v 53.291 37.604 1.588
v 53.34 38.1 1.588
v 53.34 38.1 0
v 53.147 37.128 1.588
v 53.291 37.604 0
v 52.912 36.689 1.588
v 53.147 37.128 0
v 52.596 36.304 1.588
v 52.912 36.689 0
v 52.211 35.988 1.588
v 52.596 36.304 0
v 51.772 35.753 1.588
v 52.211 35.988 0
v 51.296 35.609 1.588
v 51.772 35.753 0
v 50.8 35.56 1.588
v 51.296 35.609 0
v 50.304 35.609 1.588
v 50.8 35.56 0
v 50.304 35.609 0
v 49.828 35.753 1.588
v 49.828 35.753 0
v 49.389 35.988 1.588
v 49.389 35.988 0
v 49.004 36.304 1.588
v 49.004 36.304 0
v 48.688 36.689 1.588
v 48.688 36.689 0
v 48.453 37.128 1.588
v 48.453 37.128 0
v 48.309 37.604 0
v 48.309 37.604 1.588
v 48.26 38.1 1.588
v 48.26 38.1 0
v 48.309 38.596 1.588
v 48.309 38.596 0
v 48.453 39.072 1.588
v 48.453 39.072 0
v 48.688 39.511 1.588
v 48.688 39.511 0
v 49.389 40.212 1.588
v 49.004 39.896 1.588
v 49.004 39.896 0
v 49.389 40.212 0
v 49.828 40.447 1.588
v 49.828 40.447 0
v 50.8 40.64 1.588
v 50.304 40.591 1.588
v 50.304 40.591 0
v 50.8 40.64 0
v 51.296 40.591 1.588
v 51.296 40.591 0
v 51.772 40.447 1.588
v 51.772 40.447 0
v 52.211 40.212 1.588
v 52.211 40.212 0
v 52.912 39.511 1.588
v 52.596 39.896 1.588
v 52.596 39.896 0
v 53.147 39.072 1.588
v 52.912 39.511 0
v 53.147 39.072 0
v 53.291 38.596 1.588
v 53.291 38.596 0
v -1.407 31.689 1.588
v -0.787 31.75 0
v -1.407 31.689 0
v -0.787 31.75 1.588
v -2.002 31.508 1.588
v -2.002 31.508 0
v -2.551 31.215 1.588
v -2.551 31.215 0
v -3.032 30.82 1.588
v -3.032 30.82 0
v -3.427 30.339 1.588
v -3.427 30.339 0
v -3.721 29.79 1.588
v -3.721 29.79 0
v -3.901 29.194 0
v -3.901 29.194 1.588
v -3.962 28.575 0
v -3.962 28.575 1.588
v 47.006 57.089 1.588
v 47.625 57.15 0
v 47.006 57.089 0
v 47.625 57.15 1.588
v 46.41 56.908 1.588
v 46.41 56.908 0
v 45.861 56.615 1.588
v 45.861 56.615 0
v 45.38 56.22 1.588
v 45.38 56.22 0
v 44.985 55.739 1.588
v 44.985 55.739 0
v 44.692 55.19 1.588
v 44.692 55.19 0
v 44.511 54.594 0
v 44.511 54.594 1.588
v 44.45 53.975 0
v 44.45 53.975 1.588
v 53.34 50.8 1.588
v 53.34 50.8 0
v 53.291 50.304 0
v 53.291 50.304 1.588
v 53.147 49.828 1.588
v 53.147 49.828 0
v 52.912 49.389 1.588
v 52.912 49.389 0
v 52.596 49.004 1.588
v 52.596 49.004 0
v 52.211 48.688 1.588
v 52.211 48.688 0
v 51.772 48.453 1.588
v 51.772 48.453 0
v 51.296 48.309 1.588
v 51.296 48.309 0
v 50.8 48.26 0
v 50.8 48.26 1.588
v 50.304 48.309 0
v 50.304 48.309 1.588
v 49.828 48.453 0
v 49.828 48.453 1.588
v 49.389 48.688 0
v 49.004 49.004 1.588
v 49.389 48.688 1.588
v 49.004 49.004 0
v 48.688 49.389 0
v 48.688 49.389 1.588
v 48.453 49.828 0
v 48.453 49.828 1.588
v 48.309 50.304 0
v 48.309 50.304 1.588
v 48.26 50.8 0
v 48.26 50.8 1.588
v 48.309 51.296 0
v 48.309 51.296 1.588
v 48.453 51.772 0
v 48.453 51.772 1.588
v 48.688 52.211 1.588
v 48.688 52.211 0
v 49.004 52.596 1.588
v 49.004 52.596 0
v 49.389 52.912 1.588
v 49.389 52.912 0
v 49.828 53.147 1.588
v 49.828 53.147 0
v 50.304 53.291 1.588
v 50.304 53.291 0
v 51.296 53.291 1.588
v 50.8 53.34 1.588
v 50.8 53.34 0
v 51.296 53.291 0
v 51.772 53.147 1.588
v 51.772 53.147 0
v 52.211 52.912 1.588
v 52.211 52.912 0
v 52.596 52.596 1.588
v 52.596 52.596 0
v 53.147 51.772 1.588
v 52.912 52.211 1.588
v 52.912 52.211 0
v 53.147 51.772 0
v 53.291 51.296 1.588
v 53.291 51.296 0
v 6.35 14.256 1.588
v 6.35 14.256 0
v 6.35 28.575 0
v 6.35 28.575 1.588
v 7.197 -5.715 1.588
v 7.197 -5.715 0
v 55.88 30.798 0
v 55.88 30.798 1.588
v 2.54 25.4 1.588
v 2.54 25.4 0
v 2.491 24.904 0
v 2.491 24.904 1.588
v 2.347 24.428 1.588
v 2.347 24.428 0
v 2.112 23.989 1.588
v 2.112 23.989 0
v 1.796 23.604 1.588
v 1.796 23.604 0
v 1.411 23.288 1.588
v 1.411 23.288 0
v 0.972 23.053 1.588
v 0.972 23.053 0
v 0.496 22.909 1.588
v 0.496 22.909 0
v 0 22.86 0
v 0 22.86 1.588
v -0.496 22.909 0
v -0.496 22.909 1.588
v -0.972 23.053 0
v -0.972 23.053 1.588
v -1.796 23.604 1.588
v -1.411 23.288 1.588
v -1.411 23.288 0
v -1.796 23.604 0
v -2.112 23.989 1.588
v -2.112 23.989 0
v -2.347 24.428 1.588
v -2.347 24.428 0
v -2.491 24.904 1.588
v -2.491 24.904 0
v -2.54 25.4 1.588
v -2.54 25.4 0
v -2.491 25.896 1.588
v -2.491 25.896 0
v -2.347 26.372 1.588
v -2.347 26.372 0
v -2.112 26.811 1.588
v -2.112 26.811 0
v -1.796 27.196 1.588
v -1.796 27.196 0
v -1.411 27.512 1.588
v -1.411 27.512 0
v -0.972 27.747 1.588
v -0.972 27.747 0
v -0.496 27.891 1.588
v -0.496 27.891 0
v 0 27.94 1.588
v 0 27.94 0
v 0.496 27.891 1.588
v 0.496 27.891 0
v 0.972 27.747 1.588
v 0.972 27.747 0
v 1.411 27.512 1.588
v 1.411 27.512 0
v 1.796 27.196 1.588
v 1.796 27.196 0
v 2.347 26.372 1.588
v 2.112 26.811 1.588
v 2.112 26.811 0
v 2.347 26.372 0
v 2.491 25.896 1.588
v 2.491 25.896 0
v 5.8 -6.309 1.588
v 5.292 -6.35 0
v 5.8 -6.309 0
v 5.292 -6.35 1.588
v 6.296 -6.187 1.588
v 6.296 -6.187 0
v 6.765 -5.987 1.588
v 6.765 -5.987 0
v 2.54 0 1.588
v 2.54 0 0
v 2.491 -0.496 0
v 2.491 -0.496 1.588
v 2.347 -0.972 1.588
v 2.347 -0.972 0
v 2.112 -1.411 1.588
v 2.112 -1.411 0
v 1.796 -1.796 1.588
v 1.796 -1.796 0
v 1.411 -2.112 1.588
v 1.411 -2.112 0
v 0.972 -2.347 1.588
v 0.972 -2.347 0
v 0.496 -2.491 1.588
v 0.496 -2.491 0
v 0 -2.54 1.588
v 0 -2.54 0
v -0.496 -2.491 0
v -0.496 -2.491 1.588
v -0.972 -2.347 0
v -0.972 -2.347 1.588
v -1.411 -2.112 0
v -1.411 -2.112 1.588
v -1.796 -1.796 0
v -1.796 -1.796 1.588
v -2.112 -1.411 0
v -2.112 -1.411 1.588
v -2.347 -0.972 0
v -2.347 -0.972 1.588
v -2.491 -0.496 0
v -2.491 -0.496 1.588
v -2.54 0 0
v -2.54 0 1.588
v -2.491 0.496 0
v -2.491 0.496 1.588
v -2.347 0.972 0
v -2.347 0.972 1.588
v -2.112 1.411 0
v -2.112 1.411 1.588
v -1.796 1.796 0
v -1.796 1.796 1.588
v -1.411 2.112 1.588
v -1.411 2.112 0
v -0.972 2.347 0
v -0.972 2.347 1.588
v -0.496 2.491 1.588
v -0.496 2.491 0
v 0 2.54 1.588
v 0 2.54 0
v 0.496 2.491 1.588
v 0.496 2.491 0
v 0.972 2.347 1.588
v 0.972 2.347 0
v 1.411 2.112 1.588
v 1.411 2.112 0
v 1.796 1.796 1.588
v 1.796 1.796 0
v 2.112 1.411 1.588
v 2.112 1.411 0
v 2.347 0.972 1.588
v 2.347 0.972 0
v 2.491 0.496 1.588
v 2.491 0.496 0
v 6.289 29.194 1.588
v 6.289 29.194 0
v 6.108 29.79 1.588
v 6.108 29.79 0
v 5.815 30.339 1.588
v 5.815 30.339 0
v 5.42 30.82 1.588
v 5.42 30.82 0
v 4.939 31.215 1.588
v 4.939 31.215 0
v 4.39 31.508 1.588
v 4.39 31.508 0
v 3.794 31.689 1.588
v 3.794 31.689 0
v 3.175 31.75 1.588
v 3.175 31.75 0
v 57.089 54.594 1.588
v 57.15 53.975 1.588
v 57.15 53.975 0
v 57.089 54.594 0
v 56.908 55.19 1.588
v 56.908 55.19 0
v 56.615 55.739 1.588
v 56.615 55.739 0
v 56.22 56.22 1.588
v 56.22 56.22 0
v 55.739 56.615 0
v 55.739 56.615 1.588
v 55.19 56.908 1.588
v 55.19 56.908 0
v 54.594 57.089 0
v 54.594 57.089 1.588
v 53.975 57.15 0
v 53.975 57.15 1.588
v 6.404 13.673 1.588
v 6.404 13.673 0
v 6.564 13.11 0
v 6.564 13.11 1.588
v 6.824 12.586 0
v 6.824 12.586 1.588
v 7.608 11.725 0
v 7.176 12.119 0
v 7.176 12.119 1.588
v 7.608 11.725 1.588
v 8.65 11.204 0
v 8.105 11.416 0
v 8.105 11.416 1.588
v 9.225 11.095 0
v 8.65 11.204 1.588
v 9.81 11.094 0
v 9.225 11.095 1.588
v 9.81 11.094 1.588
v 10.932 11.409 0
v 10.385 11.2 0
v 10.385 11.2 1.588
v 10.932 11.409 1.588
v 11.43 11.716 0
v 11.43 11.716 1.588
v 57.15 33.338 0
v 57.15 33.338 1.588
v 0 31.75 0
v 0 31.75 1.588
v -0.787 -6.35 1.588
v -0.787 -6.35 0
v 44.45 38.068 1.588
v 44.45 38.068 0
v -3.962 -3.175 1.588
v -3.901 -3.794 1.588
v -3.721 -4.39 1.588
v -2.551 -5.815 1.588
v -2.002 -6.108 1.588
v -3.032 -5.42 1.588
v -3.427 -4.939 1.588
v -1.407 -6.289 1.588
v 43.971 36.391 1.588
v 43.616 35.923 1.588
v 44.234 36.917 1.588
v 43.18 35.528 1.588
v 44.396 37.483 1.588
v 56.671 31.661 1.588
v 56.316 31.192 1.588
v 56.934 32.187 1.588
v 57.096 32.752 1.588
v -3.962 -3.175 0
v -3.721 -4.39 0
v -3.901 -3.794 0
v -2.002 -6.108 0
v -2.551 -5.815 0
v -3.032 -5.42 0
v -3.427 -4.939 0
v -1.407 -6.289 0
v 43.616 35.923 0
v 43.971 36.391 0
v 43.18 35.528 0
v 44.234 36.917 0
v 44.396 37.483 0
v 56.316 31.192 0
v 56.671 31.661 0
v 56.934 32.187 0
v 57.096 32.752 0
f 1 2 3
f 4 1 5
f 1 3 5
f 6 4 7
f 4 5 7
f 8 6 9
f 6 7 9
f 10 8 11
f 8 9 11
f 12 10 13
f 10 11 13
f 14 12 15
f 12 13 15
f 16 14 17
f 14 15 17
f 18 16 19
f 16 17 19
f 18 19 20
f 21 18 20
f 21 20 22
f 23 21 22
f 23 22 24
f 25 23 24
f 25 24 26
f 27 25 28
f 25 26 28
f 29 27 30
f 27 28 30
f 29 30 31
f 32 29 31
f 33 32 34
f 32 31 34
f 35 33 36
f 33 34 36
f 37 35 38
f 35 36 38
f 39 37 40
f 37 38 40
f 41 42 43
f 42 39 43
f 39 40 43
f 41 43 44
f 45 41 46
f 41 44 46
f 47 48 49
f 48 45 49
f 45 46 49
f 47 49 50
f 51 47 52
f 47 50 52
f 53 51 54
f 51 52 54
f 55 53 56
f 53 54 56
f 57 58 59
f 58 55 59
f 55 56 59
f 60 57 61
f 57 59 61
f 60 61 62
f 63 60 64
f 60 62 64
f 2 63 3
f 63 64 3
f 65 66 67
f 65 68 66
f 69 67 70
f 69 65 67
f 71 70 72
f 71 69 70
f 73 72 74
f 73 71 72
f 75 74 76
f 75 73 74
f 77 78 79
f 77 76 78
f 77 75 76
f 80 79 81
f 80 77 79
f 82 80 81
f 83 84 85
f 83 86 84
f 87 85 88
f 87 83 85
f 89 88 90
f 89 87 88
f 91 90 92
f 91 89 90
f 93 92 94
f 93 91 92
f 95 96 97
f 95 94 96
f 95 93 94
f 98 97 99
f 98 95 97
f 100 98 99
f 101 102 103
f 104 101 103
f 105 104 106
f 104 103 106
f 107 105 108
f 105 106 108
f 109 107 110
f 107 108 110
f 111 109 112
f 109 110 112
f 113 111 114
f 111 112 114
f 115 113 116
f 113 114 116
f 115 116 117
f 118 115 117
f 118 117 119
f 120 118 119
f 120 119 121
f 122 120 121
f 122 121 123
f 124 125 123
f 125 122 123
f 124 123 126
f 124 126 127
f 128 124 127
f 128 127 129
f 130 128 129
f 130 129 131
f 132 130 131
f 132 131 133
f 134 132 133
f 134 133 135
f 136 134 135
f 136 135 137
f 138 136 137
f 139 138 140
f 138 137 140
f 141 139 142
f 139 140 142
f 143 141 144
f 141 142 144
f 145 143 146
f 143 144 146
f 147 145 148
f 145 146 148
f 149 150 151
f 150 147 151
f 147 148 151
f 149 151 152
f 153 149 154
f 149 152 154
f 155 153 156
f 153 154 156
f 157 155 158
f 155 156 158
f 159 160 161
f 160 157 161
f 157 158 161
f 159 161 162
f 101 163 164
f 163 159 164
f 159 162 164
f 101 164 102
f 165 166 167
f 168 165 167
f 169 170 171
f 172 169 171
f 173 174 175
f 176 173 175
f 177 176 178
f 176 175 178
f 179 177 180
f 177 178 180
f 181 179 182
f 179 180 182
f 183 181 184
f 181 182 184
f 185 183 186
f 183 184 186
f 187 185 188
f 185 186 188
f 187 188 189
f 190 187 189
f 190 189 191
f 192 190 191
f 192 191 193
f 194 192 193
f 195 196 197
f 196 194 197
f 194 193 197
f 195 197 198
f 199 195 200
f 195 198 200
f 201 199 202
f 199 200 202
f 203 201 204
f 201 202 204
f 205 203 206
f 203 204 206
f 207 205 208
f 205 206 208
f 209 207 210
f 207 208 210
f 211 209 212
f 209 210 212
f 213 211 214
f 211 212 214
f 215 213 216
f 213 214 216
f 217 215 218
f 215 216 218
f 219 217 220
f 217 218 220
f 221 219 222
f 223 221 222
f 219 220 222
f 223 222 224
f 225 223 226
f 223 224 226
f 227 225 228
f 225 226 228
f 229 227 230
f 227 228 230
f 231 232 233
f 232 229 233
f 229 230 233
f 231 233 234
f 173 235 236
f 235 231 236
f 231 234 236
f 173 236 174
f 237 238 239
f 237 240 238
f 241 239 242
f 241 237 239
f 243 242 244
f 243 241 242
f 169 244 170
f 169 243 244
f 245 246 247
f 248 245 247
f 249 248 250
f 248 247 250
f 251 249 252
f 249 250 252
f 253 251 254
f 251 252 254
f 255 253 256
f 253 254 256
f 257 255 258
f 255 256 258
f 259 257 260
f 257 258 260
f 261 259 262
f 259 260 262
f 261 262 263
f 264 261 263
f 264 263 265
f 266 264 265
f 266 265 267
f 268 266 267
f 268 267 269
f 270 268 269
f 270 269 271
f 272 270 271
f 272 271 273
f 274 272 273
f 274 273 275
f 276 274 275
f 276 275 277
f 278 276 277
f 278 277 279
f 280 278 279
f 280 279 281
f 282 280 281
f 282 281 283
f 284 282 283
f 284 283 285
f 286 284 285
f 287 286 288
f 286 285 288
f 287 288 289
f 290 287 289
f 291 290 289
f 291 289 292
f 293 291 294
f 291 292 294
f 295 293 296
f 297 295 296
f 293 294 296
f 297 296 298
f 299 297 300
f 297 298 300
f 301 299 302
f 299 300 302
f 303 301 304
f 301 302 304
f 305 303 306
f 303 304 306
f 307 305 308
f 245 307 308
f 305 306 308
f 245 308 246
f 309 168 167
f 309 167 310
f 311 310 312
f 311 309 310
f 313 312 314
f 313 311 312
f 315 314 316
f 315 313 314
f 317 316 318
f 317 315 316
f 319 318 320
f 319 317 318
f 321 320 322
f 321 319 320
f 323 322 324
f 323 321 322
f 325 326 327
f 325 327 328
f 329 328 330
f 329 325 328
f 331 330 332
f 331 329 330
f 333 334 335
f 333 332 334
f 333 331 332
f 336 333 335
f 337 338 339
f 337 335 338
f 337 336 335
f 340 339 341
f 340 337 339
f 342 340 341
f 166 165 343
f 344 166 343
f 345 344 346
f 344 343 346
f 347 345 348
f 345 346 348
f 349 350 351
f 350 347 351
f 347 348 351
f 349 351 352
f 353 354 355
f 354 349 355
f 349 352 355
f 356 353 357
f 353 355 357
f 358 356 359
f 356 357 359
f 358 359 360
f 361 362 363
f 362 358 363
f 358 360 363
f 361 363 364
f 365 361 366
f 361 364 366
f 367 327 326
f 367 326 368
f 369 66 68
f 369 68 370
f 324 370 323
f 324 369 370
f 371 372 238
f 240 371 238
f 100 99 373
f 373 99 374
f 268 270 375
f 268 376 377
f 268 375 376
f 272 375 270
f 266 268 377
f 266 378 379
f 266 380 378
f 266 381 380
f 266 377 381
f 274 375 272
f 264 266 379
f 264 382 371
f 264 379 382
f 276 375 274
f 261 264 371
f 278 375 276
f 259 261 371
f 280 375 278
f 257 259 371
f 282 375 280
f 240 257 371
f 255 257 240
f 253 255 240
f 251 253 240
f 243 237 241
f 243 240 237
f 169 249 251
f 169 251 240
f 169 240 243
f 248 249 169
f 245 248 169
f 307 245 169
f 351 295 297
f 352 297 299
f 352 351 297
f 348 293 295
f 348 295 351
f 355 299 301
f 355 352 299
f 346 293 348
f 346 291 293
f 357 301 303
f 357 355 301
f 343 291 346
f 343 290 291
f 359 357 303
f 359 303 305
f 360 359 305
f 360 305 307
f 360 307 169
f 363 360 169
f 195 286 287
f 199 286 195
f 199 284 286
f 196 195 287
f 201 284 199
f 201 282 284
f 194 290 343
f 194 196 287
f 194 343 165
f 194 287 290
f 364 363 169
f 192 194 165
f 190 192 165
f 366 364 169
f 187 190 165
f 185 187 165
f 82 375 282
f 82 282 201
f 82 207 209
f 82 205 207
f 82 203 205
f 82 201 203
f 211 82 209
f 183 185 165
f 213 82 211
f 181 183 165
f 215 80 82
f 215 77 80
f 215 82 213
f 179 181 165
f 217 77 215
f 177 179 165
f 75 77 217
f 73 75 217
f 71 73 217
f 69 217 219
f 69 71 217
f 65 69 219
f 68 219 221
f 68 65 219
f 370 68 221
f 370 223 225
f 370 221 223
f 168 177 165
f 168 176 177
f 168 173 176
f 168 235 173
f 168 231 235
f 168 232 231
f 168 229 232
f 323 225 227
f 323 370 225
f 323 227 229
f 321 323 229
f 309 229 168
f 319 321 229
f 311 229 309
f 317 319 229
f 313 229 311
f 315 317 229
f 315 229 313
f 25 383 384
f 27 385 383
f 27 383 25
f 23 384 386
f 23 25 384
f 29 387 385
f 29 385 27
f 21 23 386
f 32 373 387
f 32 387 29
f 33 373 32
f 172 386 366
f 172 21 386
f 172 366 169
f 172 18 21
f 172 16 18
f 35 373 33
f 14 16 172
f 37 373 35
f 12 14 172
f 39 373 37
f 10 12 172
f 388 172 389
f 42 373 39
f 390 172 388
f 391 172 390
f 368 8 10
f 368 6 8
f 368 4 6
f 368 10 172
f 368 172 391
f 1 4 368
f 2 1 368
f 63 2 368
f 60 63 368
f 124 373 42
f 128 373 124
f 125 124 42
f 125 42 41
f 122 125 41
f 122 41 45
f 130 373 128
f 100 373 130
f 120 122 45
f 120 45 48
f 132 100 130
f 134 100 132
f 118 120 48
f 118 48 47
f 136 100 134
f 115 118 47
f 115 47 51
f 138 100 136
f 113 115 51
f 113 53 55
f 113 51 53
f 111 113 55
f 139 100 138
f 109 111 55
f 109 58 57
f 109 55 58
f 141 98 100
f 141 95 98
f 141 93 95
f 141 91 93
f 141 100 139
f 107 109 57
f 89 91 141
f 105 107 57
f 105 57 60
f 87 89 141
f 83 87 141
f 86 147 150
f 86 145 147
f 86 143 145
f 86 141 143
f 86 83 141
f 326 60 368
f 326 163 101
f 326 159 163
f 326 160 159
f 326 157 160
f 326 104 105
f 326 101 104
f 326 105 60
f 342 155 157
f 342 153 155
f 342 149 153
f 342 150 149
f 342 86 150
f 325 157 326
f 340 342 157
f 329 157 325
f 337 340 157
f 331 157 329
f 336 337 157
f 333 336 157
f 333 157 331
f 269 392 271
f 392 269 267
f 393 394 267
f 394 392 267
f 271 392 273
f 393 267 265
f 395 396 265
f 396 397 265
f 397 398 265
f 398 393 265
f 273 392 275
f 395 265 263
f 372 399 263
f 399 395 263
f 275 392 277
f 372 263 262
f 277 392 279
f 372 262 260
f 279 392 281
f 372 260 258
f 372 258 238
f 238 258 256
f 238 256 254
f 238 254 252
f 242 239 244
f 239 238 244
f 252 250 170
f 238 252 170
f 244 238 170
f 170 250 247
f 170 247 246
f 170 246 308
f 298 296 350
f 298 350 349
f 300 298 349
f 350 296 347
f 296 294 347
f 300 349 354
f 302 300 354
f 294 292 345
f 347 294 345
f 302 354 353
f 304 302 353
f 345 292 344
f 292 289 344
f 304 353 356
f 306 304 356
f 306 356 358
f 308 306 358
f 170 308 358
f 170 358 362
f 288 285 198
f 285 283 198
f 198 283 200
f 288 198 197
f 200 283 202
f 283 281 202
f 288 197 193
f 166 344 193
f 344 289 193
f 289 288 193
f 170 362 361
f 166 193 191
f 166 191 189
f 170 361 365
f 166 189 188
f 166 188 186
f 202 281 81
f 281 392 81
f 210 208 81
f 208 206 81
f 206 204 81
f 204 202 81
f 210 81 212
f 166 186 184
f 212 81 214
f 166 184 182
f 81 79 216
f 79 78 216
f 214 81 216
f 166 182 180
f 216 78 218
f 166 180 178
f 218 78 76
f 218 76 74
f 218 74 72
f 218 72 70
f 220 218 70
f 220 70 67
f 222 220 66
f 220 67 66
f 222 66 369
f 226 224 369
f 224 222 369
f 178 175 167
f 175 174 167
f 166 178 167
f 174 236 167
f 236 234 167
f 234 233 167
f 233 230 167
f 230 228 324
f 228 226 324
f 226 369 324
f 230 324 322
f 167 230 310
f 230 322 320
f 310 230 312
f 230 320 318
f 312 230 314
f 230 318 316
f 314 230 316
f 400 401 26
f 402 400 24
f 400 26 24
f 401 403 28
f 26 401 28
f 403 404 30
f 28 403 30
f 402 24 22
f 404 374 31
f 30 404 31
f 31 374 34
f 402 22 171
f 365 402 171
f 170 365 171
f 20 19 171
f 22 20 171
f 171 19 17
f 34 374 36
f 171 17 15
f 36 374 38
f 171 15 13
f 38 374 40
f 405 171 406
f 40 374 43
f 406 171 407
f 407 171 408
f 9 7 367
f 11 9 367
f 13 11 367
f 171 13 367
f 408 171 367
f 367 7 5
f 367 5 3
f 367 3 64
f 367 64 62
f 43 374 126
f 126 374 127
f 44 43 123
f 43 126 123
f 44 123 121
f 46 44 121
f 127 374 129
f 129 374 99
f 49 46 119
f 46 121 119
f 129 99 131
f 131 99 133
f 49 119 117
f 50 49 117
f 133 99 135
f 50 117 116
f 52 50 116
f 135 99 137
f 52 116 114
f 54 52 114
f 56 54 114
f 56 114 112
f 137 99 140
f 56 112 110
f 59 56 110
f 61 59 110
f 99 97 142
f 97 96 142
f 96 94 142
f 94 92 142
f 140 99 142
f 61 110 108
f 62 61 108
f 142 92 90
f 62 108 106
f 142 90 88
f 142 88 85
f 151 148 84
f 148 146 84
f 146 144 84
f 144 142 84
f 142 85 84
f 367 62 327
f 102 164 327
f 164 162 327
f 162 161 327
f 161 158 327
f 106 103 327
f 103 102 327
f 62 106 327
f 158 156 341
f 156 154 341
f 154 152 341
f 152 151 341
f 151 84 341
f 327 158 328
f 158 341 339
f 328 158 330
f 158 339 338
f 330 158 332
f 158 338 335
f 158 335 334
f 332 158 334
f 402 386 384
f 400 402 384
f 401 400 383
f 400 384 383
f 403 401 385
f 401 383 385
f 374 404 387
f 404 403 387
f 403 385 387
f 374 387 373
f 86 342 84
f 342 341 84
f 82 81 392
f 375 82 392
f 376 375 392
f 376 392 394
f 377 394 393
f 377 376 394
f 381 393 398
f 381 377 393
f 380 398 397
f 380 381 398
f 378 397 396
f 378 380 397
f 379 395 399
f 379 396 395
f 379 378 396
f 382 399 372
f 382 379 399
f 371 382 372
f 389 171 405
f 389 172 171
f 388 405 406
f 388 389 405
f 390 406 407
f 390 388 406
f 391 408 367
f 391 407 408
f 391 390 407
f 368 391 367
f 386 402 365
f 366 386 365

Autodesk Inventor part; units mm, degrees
ref_plane "YZ Plane" through (0, 0, 0) normal (1, 0, 0) x (0, 1, 0)
ref_plane "XZ Plane" through (0, 0, 0) normal (0, 1, 0) x (-1, 0, 0)
ref_plane "XY Plane" through (0, 0, 0) normal (0, 0, 1) x (1, 0, 0)
sketch "Sketch1" plane through (0, 0, 0) normal (0, 0, 1) x (1, 0, 0)
  circle A0 centre (50.8, 50.8) radius 2.54
  circle A1 centre (50.8, 38.1) radius 2.54
  line L0 (50.8, 57.15) -> (57.15, 57.15)
  line L1 (57.15, 57.15) -> (57.15, 50.8)
  line L2 (50.8, 57.15) -> (44.45, 57.15)
  line L3 (44.45, 57.15) -> (44.45, 31.75)
  line L4 (44.45, 31.75) -> (57.15, 31.75)
  circle A2 centre (0, 0) radius 2.54
  circle A3 centre (0, 25.4) radius 2.54
  line L5 (57.15, 50.8) -> (57.15, 31.75)
  line L6 (50.8, 38.1) -> (50.8, 44.45)
  line L7 (50.8, 38.1) -> (57.15, 31.75)
  line L8 (50.8, 38.1) -> (44.45, 44.45)
  line L9 (0, 0) -> (6.35, 0)
  line L10 (6.35, 0) -> (6.35, 31.75)
  line L11 (6.35, -6.35) -> (6.35, 0)
  line L12 (0, 0) -> (6.35, -6.35)
  line L13 (0, 25.4) -> (0, 31.75)
  line L14 (0, 31.75) -> (-3.9624, 31.75)
  line L15 (-3.9624, 31.75) -> (-3.9624, -6.35)
  line L16 (-3.9624, -6.35) -> (6.35, -6.35)
  line L17 (6.35, -6.35) -> (57.15, 31.75)
  line L18 (0, 0) -> (-6.358, 6.358)
  line L19 (49.0039, 39.8961) -> (-1.7961, 1.7961)
  line L20 (0, 31.75) -> (6.35, 31.75)
  point P0 (6.35, 7.9056)
  point P1 (44.45, 36.4806)
  dimension "d5" = 5.08
  dimension "d13" = 5.08
  dimension "d3" = 5.08
  dimension "d7" = 6.35
  dimension "d8" = 6.35
  dimension "d12" = 25.4
  dimension "d18" = 5.08
  dimension "d24" = 6.35
  dimension "d29" = 3.9624
  dimension "d30" = 8.9916
extrude "Extrusion1" add sketch "Sketch1" along normal blind 1.5875 contours A1 L8 L3 L2 L0 L1 L5 L7 | L7 L4 L3 L19 A1 | L19 L3 L8 | L17 L11 L10 L19 L3 L4 | L12 A2 L9 L11 | L16 L15 L18 A2 L12 | L19 A2 L18 L15 L14 L20 L10 | L10 L9 A2 L19
fillet "Fillet1" radius 3.175 9 edges at (44.45, 57.15, 0.7937) (57.15, 57.15, 0.7937) (57.15, 31.75, 0.7937) (44.45, 36.4806, 0.7937) (6.35, 7.9056, 0.7937) (6.35, 31.75, 0.7937) (-3.9624, 31.75, 0.7937) (-3.9624, -6.35, 0.7937) (6.35, -6.35, 0.7937)
properties part number "funnelPoly"
